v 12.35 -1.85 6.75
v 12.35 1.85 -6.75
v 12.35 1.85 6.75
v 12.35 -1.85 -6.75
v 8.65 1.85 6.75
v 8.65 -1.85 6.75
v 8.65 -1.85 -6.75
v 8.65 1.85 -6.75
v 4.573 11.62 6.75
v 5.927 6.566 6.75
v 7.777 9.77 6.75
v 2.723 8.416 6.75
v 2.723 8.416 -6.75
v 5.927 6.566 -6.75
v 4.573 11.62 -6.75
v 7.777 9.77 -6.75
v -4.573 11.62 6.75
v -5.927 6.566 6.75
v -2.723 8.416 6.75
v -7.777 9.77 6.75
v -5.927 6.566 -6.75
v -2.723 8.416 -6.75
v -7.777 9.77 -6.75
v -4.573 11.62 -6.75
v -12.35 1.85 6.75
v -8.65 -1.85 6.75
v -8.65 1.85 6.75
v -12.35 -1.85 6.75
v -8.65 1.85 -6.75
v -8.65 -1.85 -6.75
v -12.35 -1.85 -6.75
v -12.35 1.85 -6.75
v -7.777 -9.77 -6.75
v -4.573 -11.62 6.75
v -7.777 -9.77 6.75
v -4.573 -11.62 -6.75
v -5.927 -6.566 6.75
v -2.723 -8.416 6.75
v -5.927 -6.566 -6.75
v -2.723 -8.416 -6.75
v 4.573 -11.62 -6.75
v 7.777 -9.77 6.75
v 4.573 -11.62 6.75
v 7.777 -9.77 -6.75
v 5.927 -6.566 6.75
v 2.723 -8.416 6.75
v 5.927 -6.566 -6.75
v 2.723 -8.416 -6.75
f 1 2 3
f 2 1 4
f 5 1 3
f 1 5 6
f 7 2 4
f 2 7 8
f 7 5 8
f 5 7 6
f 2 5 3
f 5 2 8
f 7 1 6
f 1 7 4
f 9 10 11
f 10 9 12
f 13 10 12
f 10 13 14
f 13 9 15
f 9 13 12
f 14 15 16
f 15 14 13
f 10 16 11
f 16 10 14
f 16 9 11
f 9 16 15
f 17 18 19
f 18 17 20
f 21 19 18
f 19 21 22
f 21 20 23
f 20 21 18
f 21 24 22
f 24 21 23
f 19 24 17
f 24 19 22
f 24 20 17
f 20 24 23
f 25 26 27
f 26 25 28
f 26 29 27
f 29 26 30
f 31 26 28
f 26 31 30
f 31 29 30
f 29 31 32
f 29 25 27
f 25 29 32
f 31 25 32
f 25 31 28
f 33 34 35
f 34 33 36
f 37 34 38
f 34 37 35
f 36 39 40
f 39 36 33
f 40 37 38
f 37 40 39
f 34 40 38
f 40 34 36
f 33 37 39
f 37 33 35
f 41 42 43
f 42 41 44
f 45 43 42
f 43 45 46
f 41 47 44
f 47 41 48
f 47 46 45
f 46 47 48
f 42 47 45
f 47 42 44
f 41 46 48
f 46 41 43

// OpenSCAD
module radial() {
    for (i = [0 : 5]) {
        rotate([0, 0, i * 60])
        translate([10.5, 0, 0])
        cube([3.7, 3.7, 13.5], center = true);
    }
}

radial();
